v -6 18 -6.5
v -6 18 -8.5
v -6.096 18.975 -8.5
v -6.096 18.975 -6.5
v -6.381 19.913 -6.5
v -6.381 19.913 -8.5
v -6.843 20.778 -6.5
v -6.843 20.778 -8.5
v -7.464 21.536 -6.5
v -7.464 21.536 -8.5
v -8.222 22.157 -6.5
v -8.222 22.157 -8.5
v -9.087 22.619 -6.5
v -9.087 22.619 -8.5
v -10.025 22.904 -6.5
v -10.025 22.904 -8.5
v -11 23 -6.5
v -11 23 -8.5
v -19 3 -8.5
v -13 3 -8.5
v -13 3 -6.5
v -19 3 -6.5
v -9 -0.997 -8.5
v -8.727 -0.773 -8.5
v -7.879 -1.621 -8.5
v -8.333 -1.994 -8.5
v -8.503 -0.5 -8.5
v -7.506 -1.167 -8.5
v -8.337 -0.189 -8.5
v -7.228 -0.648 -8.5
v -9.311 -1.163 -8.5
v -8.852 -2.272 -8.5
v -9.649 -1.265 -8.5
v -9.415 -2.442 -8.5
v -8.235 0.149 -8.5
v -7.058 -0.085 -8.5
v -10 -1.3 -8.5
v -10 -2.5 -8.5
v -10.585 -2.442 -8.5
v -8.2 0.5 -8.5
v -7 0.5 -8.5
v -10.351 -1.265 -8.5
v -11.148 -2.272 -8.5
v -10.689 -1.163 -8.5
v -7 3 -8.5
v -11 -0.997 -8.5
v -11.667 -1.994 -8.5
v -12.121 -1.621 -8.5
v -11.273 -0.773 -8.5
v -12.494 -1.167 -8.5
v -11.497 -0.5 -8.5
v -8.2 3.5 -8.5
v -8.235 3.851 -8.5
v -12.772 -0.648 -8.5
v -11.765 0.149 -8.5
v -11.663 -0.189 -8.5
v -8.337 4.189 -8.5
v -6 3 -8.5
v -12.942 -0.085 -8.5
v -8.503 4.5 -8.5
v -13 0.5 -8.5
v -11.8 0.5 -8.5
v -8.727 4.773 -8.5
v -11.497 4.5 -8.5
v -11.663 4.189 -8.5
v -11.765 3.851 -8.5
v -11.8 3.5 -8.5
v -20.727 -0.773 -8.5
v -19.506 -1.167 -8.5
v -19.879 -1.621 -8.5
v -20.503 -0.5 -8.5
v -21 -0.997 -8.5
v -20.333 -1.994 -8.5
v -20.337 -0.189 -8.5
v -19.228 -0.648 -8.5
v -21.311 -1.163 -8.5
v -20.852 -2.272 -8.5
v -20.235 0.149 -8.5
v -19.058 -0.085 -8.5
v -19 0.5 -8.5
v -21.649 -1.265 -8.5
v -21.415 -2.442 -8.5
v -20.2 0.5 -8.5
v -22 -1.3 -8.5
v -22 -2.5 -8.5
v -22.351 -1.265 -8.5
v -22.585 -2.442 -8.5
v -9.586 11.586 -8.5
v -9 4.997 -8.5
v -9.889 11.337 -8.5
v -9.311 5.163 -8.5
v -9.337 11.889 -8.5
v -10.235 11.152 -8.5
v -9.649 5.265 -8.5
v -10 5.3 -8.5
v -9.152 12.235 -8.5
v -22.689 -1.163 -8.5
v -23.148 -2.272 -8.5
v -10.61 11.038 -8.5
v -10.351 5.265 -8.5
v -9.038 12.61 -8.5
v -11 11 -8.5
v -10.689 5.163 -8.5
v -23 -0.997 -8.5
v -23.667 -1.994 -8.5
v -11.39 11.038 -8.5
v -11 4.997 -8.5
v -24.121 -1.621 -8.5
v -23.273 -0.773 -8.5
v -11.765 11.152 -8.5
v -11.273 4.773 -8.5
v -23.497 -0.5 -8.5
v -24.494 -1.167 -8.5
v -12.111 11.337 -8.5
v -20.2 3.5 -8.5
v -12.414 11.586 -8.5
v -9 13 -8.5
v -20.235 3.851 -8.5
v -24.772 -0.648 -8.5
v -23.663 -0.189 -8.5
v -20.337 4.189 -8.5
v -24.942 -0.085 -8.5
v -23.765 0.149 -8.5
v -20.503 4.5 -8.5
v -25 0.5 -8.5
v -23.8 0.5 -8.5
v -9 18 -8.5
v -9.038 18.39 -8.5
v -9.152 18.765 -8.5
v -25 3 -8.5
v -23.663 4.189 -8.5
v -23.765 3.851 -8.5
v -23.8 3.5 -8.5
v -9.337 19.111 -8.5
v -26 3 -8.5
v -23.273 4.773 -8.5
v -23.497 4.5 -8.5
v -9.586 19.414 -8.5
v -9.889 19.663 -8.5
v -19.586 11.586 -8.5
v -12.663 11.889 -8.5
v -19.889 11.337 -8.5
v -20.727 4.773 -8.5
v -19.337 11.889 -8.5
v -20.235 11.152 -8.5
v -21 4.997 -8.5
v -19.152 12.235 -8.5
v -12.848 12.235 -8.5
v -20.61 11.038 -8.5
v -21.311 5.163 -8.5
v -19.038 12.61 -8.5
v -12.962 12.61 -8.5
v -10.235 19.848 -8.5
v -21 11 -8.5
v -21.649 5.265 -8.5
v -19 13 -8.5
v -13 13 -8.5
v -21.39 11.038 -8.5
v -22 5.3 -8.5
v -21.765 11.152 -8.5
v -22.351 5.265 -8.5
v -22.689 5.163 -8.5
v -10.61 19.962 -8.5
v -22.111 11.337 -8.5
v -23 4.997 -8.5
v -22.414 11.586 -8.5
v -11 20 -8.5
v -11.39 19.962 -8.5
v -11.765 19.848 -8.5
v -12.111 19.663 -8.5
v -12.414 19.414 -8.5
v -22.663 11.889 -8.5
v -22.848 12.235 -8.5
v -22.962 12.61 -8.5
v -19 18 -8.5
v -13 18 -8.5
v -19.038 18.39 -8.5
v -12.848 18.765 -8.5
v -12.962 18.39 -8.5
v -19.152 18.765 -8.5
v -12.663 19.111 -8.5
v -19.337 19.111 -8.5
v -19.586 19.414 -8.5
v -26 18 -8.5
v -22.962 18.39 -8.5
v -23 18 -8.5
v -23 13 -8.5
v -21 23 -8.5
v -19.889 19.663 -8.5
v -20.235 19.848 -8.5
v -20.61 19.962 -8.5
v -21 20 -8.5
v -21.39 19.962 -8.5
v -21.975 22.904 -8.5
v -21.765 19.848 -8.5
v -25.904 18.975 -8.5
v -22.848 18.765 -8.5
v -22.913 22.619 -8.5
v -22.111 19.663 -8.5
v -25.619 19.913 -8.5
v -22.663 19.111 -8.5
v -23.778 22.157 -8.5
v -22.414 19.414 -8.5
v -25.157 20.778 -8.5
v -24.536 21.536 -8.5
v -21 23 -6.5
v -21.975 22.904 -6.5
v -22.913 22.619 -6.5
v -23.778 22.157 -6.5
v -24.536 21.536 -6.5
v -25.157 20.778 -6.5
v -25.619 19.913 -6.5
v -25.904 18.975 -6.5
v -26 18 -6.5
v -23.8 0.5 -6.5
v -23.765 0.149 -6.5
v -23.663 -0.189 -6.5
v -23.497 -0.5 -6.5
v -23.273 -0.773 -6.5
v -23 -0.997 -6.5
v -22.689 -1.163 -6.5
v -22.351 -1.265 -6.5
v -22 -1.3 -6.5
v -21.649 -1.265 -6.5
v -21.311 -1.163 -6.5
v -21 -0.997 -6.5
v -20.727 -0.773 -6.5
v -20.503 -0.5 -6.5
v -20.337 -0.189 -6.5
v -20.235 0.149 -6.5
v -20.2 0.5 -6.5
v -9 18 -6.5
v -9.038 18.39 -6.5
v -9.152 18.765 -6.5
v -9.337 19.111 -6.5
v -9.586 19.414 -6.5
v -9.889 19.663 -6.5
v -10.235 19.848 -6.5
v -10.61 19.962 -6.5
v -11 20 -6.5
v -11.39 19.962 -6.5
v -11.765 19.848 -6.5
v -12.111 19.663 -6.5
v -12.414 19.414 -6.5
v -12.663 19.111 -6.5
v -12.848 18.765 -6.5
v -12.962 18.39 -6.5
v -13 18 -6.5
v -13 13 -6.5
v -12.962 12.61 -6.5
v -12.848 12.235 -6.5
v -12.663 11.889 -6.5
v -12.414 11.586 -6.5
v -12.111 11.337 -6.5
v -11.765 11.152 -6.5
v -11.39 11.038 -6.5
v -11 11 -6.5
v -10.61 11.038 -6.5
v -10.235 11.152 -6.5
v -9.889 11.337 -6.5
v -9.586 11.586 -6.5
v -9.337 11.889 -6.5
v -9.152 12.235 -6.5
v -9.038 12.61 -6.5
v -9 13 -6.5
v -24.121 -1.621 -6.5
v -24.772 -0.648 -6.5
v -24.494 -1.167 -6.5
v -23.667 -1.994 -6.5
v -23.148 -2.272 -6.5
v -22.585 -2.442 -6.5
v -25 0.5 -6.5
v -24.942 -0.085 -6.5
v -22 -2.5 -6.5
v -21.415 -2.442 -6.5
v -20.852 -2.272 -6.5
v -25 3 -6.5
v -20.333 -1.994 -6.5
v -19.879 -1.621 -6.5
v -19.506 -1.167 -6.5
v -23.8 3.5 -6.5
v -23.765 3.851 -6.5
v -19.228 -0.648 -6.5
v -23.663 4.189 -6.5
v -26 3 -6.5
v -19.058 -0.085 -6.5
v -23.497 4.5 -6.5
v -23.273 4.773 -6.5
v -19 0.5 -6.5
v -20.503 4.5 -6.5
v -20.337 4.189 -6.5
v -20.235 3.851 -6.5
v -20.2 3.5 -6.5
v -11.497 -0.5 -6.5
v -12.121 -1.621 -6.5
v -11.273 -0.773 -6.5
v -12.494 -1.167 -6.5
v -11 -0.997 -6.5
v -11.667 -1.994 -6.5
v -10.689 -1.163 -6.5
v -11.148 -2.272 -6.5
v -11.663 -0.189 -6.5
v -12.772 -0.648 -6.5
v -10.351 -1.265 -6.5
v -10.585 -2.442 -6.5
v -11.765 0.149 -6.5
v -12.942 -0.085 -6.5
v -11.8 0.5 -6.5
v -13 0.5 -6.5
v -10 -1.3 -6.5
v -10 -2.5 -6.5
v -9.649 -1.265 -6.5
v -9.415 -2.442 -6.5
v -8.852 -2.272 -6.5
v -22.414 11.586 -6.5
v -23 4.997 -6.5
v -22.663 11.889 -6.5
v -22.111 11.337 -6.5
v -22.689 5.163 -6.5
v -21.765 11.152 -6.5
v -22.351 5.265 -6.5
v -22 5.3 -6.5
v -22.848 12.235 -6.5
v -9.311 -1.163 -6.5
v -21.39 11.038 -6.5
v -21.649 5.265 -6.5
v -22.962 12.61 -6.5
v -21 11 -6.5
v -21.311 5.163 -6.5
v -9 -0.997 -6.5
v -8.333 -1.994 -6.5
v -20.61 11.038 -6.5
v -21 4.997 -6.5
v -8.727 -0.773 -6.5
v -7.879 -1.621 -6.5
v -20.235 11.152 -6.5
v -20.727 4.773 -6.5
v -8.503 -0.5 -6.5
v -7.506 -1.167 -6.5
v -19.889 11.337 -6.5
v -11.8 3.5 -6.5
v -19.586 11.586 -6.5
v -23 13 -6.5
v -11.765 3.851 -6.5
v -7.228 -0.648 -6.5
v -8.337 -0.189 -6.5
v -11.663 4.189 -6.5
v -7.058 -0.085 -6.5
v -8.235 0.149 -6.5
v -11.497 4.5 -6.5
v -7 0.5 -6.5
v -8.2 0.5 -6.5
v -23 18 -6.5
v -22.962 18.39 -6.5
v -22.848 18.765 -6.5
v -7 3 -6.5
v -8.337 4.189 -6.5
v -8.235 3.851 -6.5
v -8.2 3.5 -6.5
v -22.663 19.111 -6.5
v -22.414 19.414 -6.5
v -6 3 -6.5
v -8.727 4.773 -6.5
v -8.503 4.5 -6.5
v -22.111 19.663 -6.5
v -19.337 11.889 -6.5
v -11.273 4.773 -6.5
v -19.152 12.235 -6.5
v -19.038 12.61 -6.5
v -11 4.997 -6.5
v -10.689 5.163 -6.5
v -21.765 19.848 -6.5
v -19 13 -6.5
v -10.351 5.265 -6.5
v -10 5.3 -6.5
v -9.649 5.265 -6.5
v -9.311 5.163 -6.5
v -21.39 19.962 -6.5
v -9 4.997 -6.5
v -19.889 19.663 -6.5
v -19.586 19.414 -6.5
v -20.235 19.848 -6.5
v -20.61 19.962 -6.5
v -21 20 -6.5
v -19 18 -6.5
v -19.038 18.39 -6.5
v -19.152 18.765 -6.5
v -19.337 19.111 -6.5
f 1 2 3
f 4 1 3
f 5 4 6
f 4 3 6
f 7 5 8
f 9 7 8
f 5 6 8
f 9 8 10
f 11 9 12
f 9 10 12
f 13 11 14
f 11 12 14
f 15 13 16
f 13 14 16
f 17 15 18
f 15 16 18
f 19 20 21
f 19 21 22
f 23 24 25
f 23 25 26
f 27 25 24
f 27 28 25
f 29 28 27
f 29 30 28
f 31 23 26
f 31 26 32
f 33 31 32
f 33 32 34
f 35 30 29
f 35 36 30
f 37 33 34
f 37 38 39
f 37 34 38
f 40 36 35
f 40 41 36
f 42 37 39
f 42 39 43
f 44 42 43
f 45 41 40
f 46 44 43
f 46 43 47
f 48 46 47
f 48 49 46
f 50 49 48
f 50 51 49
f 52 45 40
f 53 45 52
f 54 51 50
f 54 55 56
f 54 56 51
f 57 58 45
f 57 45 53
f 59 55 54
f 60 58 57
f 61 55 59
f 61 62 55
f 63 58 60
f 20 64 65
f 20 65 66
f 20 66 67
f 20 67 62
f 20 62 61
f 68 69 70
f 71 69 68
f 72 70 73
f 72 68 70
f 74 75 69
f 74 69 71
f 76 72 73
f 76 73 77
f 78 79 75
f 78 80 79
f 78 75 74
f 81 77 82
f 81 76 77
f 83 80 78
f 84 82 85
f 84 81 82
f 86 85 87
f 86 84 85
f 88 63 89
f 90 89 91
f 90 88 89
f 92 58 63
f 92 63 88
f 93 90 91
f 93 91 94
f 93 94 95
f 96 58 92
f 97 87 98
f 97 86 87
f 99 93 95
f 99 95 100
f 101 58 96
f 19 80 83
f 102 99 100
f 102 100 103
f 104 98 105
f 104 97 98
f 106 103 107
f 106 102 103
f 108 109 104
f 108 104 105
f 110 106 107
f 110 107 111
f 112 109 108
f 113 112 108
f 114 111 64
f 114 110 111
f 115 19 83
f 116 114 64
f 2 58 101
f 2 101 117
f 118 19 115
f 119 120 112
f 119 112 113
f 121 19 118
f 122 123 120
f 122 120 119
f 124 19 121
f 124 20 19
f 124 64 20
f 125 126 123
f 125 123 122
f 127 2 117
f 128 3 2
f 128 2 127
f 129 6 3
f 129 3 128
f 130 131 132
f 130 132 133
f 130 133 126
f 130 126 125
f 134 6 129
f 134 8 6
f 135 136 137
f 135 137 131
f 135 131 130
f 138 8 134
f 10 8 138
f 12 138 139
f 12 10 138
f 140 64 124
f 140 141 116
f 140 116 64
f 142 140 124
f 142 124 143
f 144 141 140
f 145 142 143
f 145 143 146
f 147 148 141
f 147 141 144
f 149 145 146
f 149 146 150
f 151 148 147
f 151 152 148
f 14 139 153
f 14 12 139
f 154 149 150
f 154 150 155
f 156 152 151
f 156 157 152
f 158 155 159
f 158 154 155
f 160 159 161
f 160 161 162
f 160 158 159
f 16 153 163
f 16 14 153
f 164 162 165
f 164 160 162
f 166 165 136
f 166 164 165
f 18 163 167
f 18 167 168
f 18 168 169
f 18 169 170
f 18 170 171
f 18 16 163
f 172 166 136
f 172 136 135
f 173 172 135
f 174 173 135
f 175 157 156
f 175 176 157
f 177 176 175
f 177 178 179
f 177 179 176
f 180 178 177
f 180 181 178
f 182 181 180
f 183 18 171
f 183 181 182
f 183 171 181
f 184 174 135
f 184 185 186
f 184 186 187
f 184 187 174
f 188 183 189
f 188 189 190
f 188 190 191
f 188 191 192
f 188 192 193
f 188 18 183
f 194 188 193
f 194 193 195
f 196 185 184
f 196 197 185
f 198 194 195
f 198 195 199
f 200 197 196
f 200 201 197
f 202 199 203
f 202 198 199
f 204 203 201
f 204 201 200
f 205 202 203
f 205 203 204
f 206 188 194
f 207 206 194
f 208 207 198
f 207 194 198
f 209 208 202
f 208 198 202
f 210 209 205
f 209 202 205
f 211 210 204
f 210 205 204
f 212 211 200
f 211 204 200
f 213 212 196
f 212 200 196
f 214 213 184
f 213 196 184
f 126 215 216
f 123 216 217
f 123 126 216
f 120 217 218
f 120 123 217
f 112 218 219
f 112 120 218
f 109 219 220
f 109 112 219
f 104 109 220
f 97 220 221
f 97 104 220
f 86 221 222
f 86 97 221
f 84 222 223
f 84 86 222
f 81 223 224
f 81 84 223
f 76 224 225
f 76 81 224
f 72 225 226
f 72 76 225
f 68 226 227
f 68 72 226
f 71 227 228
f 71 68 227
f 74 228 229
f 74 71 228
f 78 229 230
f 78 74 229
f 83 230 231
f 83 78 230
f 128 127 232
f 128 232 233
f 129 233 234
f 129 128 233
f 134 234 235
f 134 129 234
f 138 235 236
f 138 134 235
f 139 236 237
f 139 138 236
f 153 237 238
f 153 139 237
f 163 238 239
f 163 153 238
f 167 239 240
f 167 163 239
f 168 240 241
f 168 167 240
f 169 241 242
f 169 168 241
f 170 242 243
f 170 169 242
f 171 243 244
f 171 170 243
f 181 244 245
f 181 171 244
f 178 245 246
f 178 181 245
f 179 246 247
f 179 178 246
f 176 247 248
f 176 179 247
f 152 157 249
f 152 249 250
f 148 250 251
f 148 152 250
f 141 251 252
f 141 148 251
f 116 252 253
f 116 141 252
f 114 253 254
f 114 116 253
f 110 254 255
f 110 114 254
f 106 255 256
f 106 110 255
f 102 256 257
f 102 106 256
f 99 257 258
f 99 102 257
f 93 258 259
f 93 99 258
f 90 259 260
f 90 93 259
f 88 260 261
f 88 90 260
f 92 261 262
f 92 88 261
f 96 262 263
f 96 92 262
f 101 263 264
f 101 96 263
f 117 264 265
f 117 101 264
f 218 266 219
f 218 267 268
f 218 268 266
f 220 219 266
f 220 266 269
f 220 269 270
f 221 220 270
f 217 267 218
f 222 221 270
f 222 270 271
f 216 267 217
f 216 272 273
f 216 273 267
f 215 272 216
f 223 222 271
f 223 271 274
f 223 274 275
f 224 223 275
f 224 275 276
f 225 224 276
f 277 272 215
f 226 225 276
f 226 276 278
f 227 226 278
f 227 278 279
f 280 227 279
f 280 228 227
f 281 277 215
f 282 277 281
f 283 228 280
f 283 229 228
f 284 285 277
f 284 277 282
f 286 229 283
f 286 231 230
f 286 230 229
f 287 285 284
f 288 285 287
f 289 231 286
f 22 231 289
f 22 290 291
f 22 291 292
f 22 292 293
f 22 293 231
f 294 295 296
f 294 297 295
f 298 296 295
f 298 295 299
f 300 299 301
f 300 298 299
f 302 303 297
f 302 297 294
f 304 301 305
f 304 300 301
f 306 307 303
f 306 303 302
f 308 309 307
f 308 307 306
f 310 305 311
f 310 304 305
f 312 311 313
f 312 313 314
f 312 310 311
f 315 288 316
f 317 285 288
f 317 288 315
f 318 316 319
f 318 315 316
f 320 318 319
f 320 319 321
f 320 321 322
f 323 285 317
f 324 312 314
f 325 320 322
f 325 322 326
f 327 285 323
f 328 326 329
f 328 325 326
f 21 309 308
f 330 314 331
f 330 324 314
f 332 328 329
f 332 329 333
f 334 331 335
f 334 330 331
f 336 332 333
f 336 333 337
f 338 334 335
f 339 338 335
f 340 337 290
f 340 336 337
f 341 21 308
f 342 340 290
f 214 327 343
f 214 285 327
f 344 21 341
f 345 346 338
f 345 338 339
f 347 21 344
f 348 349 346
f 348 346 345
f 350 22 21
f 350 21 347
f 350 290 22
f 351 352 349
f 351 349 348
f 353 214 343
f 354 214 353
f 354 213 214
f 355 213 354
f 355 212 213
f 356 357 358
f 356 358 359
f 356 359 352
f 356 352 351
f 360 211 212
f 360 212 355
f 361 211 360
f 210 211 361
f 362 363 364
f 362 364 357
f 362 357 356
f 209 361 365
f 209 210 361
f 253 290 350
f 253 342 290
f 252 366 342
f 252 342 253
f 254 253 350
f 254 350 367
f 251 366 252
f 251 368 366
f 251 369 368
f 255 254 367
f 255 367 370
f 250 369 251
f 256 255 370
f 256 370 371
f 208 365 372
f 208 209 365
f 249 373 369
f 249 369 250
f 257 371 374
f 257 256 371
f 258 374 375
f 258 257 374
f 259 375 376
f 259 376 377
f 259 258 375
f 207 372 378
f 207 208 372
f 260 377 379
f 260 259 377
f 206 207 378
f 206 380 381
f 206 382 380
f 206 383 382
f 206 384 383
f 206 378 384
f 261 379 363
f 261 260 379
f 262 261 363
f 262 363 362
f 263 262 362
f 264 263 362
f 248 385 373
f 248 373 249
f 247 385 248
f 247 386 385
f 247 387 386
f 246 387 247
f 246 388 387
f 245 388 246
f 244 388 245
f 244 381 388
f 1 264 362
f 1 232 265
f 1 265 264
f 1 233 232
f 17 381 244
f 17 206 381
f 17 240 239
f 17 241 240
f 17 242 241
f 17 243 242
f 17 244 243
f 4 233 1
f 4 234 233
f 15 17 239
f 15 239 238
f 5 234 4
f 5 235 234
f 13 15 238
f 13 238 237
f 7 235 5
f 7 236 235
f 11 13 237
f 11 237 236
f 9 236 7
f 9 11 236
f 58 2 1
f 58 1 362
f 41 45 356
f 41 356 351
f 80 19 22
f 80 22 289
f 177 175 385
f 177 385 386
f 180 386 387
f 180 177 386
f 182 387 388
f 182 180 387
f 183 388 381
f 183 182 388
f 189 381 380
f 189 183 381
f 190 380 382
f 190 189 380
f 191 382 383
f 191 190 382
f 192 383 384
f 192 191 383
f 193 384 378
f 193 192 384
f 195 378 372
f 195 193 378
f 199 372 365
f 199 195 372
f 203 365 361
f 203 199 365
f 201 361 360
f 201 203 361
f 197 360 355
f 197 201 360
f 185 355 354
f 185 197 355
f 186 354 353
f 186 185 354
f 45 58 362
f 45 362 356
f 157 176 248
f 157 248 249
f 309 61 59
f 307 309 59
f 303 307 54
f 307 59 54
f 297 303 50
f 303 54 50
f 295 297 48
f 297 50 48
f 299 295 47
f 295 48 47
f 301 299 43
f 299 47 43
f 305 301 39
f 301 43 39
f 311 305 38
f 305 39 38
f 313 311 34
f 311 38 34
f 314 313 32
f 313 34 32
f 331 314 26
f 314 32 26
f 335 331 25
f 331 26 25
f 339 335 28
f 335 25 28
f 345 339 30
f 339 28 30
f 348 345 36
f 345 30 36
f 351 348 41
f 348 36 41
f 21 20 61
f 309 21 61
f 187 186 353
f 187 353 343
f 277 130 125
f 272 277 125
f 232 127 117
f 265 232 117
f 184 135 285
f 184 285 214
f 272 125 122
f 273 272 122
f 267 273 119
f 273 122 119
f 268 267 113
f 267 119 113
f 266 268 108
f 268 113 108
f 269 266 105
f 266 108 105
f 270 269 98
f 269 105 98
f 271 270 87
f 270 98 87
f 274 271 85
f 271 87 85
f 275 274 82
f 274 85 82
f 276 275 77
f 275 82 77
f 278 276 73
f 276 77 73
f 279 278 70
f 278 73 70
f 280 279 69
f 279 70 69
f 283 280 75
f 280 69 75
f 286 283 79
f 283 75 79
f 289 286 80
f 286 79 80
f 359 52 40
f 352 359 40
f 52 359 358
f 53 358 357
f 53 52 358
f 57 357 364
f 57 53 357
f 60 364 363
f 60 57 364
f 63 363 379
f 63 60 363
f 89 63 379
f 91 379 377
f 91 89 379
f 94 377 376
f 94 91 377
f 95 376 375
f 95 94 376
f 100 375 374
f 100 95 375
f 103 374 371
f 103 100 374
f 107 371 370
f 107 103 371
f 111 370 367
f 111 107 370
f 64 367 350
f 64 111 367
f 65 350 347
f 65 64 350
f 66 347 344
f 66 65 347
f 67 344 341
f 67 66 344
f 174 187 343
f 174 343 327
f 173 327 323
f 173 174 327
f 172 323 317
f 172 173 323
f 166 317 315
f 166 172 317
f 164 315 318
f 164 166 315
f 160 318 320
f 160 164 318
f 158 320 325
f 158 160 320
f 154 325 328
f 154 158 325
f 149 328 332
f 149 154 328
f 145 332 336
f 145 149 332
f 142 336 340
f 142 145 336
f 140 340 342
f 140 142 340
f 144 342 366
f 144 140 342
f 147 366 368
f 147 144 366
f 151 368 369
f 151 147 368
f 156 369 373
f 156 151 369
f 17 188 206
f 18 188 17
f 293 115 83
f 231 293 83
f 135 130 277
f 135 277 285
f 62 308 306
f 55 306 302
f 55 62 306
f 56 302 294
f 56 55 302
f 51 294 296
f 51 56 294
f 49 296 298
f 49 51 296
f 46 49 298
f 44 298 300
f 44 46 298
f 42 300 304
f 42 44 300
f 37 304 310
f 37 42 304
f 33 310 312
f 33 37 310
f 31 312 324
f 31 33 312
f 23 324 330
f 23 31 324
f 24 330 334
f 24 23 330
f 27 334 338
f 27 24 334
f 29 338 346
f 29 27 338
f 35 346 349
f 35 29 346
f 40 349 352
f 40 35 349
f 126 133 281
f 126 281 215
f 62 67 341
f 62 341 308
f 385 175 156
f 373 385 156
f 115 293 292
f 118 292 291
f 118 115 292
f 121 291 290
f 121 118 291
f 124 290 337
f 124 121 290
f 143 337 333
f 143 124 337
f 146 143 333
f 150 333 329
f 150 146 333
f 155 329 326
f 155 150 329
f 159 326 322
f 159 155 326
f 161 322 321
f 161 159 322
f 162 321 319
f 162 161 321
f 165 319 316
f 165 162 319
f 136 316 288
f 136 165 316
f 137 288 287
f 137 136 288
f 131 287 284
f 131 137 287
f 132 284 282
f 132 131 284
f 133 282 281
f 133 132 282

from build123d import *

# Parameters (mm, degrees)
PAD041_DEPTH    = 2
PAD042_DEPTH    = 2
POCKET014_DEPTH = 2.001


with BuildPart() as part:
    # Sketch064 → Pad041 (new body)
    with BuildSketch(Plane.XY):
        with BuildLine():
            Line((-5, 21), (5, 21))
            ThreePointArc((10, 16), (8.535534, 19.535534), (5, 21))
            Line((10, 16), (10, 1))
            Line((10, 1), (-10, 1))
            Line((-10, 1), (-10, 16))
            ThreePointArc((-5, 21), (-8.535534, 19.535534), (-10, 16))
        make_face()
        with BuildLine():
            ThreePointArc((-3, 16), (-5, 18), (-7, 16))
            Line((-7, 16), (-7, 11))
            ThreePointArc((-7, 11), (-5, 9), (-3, 11))
            Line((-3, 16), (-3, 11))
        make_face(mode=Mode.SUBTRACT)
        with BuildLine():
            ThreePointArc((7, 16), (5, 18), (3, 16))
            Line((3, 16), (3, 11))
            ThreePointArc((3, 11), (5, 9), (7, 11))
            Line((7, 16), (7, 11))
        make_face(mode=Mode.SUBTRACT)
    extrude(amount=PAD041_DEPTH)

    # Sketch065 → Pad042 (join)
    with BuildSketch(Plane.XY):
        with BuildLine():
            ThreePointArc((-3, 1.5), (-6, 4.5), (-9, 1.5))
            Line((-9, 1.5), (-9, -1.5))
            ThreePointArc((-9, -1.5), (-6, -4.5), (-3, -1.5))
            Line((-3, 1.5), (-3, -1.5))
        make_face()
        with BuildLine():
            ThreePointArc((9, 1.5), (6, 4.5), (3, 1.5))
            Line((3, 1.5), (3, -1.5))
            ThreePointArc((3, -1.5), (6, -4.5), (9, -1.5))
            Line((9, 1.5), (9, -1.5))
        make_face()
    extrude(amount=PAD042_DEPTH)

    # Sketch066 → Pocket014 (cut, through all)
    with BuildSketch(Plane.XY):
        with BuildLine():
            ThreePointArc((-4.2, 1.5), (-6, 3.3), (-7.8, 1.5))
            Line((-7.8, 1.5), (-7.8, -1.5))
            ThreePointArc((-7.8, -1.5), (-6, -3.3), (-4.2, -1.5))
            Line((-4.2, 1.5), (-4.2, -1.5))
        make_face()
        with BuildLine():
            ThreePointArc((7.8, 1.5), (6, 3.3), (4.2, 1.5))
            Line((4.2, 1.5), (4.2, -1.5))
            ThreePointArc((4.2, -1.5), (6, -3.3), (7.8, -1.5))
            Line((7.8, 1.5), (7.8, -1.5))
        make_face()
    extrude(amount=POCKET014_DEPTH, mode=Mode.SUBTRACT)


with BuildPart() as part_1:
    # Body013 placement: moved
    add(part.part.moved(Location((-16, 2, -8.5))))


solid = part_1.part
